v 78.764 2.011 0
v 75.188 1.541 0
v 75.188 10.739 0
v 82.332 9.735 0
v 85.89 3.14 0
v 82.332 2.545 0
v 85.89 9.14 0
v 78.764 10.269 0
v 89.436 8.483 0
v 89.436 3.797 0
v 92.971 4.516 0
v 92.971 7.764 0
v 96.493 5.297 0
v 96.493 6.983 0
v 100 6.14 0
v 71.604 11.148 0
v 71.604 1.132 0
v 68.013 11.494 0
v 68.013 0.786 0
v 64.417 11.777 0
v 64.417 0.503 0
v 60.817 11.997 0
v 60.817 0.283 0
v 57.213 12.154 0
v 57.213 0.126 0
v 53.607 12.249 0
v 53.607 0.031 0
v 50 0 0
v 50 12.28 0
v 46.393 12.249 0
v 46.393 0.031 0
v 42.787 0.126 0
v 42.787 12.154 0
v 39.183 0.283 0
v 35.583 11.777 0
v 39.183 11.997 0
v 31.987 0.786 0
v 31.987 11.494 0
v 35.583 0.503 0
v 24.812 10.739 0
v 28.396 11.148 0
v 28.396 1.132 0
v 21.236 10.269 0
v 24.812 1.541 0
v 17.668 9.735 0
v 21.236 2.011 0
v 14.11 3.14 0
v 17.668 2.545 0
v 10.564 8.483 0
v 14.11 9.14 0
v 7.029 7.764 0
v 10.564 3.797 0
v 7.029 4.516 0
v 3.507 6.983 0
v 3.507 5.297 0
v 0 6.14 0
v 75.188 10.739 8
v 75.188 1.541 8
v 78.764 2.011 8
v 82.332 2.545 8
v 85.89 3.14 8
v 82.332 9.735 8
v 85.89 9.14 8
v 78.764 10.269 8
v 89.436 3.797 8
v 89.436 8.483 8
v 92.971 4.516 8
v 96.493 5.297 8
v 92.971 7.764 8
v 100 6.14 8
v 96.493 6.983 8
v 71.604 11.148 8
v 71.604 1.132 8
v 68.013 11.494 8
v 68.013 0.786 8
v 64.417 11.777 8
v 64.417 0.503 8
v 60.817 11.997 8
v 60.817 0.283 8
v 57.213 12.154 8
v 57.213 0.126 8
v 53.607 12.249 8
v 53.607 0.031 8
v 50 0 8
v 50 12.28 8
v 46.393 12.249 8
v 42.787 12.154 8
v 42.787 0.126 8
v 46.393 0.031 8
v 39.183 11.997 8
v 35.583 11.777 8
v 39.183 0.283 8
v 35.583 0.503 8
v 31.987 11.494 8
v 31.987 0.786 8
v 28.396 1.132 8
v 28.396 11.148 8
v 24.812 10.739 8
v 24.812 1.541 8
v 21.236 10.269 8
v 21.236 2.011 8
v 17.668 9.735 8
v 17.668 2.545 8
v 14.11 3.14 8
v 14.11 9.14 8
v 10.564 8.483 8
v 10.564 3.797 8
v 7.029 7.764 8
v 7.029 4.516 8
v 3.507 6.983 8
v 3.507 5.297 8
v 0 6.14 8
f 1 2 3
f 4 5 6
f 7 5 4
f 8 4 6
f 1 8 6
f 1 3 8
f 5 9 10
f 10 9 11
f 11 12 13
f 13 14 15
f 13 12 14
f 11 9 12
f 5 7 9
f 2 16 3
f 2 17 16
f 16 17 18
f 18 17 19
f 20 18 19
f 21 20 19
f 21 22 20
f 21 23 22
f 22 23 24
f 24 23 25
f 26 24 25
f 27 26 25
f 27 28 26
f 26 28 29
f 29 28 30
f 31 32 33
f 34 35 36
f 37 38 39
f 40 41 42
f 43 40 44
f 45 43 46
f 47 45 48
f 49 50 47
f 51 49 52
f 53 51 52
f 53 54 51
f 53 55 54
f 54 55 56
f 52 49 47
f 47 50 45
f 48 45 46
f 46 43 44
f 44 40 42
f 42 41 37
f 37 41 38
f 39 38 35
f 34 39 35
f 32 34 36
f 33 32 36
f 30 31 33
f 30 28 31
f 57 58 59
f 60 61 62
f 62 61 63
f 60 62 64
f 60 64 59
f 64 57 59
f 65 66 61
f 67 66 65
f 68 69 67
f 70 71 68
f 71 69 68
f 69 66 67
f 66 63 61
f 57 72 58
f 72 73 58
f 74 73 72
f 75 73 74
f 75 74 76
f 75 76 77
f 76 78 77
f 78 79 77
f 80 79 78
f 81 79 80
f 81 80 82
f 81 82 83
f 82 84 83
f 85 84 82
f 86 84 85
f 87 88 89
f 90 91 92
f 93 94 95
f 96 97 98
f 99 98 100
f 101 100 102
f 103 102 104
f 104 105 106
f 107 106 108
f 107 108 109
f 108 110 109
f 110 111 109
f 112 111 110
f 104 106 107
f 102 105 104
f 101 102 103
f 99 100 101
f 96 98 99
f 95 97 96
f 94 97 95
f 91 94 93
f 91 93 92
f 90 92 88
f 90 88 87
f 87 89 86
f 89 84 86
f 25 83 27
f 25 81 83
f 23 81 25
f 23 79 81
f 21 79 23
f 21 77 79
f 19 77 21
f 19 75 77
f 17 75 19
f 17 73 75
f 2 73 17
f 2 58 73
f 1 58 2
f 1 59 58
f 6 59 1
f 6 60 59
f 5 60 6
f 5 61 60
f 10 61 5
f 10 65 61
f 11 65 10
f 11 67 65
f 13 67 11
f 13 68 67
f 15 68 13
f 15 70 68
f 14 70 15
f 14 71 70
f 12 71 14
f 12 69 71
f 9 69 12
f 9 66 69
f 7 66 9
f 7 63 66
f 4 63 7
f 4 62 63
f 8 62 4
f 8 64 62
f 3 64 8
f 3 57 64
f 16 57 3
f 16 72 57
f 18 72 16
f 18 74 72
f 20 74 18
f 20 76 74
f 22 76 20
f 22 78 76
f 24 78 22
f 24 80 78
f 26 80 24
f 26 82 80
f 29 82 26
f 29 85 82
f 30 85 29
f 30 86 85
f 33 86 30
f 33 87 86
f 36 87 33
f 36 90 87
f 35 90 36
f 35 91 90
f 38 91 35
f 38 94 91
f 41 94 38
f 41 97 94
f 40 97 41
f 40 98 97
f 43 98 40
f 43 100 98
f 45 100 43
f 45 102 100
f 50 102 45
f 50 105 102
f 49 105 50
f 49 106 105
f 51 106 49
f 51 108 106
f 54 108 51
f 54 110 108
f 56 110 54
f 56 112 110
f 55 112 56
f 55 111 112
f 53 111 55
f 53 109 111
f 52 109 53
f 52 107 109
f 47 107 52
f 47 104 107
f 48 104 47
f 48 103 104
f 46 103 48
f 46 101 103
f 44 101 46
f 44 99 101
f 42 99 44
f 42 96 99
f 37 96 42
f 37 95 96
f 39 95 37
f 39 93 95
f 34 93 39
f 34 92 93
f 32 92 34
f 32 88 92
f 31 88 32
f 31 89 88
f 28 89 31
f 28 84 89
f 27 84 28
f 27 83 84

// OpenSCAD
$fn = 32;

// ----------------------------------------------------------------------
// Arc profile plate: lens, 56 points
// ----------------------------------------------------------------------

// --- parameters (mm) ---
lens_chord = 100;         // chord length of the lens, X
arc_r = 206.68;           // radius of both arcs
arc_angle = 28;           // angle of each arc, degrees
sagitta = 6.14;           // bulge of each arc (half the lens height)
arc_step = 1;             // sampling step of the arcs, degrees
plate_t = 8;              // plate thickness, Z

bbox_y = 2 * sagitta;  // full lens height

profile = [[100, 6.14], [96.493, 6.983], [92.971, 7.764], [89.436, 8.483], [85.89, 9.14], [82.332, 9.735], [78.764, 10.269], [75.188, 10.739], [71.604, 11.148], [68.013, 11.494], [64.417, 11.777], [60.817, 11.997], [57.213, 12.154], [53.607, 12.249], [50, 12.28], [46.393, 12.249], [42.787, 12.154], [39.183, 11.997], [35.583, 11.777], [31.987, 11.494], [28.396, 11.148], [24.812, 10.739], [21.236, 10.269], [17.668, 9.735], [14.11, 9.14], [10.564, 8.483], [7.029, 7.764], [3.507, 6.983], [0, 6.14], [3.507, 5.297], [7.029, 4.516], [10.564, 3.797], [14.11, 3.14], [17.668, 2.545], [21.236, 2.011], [24.812, 1.541], [28.396, 1.132], [31.987, 0.786], [35.583, 0.503], [39.183, 0.283], [42.787, 0.126], [46.393, 0.031], [50, 0], [53.607, 0.031], [57.213, 0.126], [60.817, 0.283], [64.417, 0.503], [68.013, 0.786], [71.604, 1.132], [75.188, 1.541], [78.764, 2.011], [82.332, 2.545], [85.89, 3.14], [89.436, 3.797], [92.971, 4.516], [96.493, 5.297]];  // primary outline, 56 points, counter clockwise

// --- the one profile operation ---
linear_extrude(height = plate_t) polygon(points = profile);
